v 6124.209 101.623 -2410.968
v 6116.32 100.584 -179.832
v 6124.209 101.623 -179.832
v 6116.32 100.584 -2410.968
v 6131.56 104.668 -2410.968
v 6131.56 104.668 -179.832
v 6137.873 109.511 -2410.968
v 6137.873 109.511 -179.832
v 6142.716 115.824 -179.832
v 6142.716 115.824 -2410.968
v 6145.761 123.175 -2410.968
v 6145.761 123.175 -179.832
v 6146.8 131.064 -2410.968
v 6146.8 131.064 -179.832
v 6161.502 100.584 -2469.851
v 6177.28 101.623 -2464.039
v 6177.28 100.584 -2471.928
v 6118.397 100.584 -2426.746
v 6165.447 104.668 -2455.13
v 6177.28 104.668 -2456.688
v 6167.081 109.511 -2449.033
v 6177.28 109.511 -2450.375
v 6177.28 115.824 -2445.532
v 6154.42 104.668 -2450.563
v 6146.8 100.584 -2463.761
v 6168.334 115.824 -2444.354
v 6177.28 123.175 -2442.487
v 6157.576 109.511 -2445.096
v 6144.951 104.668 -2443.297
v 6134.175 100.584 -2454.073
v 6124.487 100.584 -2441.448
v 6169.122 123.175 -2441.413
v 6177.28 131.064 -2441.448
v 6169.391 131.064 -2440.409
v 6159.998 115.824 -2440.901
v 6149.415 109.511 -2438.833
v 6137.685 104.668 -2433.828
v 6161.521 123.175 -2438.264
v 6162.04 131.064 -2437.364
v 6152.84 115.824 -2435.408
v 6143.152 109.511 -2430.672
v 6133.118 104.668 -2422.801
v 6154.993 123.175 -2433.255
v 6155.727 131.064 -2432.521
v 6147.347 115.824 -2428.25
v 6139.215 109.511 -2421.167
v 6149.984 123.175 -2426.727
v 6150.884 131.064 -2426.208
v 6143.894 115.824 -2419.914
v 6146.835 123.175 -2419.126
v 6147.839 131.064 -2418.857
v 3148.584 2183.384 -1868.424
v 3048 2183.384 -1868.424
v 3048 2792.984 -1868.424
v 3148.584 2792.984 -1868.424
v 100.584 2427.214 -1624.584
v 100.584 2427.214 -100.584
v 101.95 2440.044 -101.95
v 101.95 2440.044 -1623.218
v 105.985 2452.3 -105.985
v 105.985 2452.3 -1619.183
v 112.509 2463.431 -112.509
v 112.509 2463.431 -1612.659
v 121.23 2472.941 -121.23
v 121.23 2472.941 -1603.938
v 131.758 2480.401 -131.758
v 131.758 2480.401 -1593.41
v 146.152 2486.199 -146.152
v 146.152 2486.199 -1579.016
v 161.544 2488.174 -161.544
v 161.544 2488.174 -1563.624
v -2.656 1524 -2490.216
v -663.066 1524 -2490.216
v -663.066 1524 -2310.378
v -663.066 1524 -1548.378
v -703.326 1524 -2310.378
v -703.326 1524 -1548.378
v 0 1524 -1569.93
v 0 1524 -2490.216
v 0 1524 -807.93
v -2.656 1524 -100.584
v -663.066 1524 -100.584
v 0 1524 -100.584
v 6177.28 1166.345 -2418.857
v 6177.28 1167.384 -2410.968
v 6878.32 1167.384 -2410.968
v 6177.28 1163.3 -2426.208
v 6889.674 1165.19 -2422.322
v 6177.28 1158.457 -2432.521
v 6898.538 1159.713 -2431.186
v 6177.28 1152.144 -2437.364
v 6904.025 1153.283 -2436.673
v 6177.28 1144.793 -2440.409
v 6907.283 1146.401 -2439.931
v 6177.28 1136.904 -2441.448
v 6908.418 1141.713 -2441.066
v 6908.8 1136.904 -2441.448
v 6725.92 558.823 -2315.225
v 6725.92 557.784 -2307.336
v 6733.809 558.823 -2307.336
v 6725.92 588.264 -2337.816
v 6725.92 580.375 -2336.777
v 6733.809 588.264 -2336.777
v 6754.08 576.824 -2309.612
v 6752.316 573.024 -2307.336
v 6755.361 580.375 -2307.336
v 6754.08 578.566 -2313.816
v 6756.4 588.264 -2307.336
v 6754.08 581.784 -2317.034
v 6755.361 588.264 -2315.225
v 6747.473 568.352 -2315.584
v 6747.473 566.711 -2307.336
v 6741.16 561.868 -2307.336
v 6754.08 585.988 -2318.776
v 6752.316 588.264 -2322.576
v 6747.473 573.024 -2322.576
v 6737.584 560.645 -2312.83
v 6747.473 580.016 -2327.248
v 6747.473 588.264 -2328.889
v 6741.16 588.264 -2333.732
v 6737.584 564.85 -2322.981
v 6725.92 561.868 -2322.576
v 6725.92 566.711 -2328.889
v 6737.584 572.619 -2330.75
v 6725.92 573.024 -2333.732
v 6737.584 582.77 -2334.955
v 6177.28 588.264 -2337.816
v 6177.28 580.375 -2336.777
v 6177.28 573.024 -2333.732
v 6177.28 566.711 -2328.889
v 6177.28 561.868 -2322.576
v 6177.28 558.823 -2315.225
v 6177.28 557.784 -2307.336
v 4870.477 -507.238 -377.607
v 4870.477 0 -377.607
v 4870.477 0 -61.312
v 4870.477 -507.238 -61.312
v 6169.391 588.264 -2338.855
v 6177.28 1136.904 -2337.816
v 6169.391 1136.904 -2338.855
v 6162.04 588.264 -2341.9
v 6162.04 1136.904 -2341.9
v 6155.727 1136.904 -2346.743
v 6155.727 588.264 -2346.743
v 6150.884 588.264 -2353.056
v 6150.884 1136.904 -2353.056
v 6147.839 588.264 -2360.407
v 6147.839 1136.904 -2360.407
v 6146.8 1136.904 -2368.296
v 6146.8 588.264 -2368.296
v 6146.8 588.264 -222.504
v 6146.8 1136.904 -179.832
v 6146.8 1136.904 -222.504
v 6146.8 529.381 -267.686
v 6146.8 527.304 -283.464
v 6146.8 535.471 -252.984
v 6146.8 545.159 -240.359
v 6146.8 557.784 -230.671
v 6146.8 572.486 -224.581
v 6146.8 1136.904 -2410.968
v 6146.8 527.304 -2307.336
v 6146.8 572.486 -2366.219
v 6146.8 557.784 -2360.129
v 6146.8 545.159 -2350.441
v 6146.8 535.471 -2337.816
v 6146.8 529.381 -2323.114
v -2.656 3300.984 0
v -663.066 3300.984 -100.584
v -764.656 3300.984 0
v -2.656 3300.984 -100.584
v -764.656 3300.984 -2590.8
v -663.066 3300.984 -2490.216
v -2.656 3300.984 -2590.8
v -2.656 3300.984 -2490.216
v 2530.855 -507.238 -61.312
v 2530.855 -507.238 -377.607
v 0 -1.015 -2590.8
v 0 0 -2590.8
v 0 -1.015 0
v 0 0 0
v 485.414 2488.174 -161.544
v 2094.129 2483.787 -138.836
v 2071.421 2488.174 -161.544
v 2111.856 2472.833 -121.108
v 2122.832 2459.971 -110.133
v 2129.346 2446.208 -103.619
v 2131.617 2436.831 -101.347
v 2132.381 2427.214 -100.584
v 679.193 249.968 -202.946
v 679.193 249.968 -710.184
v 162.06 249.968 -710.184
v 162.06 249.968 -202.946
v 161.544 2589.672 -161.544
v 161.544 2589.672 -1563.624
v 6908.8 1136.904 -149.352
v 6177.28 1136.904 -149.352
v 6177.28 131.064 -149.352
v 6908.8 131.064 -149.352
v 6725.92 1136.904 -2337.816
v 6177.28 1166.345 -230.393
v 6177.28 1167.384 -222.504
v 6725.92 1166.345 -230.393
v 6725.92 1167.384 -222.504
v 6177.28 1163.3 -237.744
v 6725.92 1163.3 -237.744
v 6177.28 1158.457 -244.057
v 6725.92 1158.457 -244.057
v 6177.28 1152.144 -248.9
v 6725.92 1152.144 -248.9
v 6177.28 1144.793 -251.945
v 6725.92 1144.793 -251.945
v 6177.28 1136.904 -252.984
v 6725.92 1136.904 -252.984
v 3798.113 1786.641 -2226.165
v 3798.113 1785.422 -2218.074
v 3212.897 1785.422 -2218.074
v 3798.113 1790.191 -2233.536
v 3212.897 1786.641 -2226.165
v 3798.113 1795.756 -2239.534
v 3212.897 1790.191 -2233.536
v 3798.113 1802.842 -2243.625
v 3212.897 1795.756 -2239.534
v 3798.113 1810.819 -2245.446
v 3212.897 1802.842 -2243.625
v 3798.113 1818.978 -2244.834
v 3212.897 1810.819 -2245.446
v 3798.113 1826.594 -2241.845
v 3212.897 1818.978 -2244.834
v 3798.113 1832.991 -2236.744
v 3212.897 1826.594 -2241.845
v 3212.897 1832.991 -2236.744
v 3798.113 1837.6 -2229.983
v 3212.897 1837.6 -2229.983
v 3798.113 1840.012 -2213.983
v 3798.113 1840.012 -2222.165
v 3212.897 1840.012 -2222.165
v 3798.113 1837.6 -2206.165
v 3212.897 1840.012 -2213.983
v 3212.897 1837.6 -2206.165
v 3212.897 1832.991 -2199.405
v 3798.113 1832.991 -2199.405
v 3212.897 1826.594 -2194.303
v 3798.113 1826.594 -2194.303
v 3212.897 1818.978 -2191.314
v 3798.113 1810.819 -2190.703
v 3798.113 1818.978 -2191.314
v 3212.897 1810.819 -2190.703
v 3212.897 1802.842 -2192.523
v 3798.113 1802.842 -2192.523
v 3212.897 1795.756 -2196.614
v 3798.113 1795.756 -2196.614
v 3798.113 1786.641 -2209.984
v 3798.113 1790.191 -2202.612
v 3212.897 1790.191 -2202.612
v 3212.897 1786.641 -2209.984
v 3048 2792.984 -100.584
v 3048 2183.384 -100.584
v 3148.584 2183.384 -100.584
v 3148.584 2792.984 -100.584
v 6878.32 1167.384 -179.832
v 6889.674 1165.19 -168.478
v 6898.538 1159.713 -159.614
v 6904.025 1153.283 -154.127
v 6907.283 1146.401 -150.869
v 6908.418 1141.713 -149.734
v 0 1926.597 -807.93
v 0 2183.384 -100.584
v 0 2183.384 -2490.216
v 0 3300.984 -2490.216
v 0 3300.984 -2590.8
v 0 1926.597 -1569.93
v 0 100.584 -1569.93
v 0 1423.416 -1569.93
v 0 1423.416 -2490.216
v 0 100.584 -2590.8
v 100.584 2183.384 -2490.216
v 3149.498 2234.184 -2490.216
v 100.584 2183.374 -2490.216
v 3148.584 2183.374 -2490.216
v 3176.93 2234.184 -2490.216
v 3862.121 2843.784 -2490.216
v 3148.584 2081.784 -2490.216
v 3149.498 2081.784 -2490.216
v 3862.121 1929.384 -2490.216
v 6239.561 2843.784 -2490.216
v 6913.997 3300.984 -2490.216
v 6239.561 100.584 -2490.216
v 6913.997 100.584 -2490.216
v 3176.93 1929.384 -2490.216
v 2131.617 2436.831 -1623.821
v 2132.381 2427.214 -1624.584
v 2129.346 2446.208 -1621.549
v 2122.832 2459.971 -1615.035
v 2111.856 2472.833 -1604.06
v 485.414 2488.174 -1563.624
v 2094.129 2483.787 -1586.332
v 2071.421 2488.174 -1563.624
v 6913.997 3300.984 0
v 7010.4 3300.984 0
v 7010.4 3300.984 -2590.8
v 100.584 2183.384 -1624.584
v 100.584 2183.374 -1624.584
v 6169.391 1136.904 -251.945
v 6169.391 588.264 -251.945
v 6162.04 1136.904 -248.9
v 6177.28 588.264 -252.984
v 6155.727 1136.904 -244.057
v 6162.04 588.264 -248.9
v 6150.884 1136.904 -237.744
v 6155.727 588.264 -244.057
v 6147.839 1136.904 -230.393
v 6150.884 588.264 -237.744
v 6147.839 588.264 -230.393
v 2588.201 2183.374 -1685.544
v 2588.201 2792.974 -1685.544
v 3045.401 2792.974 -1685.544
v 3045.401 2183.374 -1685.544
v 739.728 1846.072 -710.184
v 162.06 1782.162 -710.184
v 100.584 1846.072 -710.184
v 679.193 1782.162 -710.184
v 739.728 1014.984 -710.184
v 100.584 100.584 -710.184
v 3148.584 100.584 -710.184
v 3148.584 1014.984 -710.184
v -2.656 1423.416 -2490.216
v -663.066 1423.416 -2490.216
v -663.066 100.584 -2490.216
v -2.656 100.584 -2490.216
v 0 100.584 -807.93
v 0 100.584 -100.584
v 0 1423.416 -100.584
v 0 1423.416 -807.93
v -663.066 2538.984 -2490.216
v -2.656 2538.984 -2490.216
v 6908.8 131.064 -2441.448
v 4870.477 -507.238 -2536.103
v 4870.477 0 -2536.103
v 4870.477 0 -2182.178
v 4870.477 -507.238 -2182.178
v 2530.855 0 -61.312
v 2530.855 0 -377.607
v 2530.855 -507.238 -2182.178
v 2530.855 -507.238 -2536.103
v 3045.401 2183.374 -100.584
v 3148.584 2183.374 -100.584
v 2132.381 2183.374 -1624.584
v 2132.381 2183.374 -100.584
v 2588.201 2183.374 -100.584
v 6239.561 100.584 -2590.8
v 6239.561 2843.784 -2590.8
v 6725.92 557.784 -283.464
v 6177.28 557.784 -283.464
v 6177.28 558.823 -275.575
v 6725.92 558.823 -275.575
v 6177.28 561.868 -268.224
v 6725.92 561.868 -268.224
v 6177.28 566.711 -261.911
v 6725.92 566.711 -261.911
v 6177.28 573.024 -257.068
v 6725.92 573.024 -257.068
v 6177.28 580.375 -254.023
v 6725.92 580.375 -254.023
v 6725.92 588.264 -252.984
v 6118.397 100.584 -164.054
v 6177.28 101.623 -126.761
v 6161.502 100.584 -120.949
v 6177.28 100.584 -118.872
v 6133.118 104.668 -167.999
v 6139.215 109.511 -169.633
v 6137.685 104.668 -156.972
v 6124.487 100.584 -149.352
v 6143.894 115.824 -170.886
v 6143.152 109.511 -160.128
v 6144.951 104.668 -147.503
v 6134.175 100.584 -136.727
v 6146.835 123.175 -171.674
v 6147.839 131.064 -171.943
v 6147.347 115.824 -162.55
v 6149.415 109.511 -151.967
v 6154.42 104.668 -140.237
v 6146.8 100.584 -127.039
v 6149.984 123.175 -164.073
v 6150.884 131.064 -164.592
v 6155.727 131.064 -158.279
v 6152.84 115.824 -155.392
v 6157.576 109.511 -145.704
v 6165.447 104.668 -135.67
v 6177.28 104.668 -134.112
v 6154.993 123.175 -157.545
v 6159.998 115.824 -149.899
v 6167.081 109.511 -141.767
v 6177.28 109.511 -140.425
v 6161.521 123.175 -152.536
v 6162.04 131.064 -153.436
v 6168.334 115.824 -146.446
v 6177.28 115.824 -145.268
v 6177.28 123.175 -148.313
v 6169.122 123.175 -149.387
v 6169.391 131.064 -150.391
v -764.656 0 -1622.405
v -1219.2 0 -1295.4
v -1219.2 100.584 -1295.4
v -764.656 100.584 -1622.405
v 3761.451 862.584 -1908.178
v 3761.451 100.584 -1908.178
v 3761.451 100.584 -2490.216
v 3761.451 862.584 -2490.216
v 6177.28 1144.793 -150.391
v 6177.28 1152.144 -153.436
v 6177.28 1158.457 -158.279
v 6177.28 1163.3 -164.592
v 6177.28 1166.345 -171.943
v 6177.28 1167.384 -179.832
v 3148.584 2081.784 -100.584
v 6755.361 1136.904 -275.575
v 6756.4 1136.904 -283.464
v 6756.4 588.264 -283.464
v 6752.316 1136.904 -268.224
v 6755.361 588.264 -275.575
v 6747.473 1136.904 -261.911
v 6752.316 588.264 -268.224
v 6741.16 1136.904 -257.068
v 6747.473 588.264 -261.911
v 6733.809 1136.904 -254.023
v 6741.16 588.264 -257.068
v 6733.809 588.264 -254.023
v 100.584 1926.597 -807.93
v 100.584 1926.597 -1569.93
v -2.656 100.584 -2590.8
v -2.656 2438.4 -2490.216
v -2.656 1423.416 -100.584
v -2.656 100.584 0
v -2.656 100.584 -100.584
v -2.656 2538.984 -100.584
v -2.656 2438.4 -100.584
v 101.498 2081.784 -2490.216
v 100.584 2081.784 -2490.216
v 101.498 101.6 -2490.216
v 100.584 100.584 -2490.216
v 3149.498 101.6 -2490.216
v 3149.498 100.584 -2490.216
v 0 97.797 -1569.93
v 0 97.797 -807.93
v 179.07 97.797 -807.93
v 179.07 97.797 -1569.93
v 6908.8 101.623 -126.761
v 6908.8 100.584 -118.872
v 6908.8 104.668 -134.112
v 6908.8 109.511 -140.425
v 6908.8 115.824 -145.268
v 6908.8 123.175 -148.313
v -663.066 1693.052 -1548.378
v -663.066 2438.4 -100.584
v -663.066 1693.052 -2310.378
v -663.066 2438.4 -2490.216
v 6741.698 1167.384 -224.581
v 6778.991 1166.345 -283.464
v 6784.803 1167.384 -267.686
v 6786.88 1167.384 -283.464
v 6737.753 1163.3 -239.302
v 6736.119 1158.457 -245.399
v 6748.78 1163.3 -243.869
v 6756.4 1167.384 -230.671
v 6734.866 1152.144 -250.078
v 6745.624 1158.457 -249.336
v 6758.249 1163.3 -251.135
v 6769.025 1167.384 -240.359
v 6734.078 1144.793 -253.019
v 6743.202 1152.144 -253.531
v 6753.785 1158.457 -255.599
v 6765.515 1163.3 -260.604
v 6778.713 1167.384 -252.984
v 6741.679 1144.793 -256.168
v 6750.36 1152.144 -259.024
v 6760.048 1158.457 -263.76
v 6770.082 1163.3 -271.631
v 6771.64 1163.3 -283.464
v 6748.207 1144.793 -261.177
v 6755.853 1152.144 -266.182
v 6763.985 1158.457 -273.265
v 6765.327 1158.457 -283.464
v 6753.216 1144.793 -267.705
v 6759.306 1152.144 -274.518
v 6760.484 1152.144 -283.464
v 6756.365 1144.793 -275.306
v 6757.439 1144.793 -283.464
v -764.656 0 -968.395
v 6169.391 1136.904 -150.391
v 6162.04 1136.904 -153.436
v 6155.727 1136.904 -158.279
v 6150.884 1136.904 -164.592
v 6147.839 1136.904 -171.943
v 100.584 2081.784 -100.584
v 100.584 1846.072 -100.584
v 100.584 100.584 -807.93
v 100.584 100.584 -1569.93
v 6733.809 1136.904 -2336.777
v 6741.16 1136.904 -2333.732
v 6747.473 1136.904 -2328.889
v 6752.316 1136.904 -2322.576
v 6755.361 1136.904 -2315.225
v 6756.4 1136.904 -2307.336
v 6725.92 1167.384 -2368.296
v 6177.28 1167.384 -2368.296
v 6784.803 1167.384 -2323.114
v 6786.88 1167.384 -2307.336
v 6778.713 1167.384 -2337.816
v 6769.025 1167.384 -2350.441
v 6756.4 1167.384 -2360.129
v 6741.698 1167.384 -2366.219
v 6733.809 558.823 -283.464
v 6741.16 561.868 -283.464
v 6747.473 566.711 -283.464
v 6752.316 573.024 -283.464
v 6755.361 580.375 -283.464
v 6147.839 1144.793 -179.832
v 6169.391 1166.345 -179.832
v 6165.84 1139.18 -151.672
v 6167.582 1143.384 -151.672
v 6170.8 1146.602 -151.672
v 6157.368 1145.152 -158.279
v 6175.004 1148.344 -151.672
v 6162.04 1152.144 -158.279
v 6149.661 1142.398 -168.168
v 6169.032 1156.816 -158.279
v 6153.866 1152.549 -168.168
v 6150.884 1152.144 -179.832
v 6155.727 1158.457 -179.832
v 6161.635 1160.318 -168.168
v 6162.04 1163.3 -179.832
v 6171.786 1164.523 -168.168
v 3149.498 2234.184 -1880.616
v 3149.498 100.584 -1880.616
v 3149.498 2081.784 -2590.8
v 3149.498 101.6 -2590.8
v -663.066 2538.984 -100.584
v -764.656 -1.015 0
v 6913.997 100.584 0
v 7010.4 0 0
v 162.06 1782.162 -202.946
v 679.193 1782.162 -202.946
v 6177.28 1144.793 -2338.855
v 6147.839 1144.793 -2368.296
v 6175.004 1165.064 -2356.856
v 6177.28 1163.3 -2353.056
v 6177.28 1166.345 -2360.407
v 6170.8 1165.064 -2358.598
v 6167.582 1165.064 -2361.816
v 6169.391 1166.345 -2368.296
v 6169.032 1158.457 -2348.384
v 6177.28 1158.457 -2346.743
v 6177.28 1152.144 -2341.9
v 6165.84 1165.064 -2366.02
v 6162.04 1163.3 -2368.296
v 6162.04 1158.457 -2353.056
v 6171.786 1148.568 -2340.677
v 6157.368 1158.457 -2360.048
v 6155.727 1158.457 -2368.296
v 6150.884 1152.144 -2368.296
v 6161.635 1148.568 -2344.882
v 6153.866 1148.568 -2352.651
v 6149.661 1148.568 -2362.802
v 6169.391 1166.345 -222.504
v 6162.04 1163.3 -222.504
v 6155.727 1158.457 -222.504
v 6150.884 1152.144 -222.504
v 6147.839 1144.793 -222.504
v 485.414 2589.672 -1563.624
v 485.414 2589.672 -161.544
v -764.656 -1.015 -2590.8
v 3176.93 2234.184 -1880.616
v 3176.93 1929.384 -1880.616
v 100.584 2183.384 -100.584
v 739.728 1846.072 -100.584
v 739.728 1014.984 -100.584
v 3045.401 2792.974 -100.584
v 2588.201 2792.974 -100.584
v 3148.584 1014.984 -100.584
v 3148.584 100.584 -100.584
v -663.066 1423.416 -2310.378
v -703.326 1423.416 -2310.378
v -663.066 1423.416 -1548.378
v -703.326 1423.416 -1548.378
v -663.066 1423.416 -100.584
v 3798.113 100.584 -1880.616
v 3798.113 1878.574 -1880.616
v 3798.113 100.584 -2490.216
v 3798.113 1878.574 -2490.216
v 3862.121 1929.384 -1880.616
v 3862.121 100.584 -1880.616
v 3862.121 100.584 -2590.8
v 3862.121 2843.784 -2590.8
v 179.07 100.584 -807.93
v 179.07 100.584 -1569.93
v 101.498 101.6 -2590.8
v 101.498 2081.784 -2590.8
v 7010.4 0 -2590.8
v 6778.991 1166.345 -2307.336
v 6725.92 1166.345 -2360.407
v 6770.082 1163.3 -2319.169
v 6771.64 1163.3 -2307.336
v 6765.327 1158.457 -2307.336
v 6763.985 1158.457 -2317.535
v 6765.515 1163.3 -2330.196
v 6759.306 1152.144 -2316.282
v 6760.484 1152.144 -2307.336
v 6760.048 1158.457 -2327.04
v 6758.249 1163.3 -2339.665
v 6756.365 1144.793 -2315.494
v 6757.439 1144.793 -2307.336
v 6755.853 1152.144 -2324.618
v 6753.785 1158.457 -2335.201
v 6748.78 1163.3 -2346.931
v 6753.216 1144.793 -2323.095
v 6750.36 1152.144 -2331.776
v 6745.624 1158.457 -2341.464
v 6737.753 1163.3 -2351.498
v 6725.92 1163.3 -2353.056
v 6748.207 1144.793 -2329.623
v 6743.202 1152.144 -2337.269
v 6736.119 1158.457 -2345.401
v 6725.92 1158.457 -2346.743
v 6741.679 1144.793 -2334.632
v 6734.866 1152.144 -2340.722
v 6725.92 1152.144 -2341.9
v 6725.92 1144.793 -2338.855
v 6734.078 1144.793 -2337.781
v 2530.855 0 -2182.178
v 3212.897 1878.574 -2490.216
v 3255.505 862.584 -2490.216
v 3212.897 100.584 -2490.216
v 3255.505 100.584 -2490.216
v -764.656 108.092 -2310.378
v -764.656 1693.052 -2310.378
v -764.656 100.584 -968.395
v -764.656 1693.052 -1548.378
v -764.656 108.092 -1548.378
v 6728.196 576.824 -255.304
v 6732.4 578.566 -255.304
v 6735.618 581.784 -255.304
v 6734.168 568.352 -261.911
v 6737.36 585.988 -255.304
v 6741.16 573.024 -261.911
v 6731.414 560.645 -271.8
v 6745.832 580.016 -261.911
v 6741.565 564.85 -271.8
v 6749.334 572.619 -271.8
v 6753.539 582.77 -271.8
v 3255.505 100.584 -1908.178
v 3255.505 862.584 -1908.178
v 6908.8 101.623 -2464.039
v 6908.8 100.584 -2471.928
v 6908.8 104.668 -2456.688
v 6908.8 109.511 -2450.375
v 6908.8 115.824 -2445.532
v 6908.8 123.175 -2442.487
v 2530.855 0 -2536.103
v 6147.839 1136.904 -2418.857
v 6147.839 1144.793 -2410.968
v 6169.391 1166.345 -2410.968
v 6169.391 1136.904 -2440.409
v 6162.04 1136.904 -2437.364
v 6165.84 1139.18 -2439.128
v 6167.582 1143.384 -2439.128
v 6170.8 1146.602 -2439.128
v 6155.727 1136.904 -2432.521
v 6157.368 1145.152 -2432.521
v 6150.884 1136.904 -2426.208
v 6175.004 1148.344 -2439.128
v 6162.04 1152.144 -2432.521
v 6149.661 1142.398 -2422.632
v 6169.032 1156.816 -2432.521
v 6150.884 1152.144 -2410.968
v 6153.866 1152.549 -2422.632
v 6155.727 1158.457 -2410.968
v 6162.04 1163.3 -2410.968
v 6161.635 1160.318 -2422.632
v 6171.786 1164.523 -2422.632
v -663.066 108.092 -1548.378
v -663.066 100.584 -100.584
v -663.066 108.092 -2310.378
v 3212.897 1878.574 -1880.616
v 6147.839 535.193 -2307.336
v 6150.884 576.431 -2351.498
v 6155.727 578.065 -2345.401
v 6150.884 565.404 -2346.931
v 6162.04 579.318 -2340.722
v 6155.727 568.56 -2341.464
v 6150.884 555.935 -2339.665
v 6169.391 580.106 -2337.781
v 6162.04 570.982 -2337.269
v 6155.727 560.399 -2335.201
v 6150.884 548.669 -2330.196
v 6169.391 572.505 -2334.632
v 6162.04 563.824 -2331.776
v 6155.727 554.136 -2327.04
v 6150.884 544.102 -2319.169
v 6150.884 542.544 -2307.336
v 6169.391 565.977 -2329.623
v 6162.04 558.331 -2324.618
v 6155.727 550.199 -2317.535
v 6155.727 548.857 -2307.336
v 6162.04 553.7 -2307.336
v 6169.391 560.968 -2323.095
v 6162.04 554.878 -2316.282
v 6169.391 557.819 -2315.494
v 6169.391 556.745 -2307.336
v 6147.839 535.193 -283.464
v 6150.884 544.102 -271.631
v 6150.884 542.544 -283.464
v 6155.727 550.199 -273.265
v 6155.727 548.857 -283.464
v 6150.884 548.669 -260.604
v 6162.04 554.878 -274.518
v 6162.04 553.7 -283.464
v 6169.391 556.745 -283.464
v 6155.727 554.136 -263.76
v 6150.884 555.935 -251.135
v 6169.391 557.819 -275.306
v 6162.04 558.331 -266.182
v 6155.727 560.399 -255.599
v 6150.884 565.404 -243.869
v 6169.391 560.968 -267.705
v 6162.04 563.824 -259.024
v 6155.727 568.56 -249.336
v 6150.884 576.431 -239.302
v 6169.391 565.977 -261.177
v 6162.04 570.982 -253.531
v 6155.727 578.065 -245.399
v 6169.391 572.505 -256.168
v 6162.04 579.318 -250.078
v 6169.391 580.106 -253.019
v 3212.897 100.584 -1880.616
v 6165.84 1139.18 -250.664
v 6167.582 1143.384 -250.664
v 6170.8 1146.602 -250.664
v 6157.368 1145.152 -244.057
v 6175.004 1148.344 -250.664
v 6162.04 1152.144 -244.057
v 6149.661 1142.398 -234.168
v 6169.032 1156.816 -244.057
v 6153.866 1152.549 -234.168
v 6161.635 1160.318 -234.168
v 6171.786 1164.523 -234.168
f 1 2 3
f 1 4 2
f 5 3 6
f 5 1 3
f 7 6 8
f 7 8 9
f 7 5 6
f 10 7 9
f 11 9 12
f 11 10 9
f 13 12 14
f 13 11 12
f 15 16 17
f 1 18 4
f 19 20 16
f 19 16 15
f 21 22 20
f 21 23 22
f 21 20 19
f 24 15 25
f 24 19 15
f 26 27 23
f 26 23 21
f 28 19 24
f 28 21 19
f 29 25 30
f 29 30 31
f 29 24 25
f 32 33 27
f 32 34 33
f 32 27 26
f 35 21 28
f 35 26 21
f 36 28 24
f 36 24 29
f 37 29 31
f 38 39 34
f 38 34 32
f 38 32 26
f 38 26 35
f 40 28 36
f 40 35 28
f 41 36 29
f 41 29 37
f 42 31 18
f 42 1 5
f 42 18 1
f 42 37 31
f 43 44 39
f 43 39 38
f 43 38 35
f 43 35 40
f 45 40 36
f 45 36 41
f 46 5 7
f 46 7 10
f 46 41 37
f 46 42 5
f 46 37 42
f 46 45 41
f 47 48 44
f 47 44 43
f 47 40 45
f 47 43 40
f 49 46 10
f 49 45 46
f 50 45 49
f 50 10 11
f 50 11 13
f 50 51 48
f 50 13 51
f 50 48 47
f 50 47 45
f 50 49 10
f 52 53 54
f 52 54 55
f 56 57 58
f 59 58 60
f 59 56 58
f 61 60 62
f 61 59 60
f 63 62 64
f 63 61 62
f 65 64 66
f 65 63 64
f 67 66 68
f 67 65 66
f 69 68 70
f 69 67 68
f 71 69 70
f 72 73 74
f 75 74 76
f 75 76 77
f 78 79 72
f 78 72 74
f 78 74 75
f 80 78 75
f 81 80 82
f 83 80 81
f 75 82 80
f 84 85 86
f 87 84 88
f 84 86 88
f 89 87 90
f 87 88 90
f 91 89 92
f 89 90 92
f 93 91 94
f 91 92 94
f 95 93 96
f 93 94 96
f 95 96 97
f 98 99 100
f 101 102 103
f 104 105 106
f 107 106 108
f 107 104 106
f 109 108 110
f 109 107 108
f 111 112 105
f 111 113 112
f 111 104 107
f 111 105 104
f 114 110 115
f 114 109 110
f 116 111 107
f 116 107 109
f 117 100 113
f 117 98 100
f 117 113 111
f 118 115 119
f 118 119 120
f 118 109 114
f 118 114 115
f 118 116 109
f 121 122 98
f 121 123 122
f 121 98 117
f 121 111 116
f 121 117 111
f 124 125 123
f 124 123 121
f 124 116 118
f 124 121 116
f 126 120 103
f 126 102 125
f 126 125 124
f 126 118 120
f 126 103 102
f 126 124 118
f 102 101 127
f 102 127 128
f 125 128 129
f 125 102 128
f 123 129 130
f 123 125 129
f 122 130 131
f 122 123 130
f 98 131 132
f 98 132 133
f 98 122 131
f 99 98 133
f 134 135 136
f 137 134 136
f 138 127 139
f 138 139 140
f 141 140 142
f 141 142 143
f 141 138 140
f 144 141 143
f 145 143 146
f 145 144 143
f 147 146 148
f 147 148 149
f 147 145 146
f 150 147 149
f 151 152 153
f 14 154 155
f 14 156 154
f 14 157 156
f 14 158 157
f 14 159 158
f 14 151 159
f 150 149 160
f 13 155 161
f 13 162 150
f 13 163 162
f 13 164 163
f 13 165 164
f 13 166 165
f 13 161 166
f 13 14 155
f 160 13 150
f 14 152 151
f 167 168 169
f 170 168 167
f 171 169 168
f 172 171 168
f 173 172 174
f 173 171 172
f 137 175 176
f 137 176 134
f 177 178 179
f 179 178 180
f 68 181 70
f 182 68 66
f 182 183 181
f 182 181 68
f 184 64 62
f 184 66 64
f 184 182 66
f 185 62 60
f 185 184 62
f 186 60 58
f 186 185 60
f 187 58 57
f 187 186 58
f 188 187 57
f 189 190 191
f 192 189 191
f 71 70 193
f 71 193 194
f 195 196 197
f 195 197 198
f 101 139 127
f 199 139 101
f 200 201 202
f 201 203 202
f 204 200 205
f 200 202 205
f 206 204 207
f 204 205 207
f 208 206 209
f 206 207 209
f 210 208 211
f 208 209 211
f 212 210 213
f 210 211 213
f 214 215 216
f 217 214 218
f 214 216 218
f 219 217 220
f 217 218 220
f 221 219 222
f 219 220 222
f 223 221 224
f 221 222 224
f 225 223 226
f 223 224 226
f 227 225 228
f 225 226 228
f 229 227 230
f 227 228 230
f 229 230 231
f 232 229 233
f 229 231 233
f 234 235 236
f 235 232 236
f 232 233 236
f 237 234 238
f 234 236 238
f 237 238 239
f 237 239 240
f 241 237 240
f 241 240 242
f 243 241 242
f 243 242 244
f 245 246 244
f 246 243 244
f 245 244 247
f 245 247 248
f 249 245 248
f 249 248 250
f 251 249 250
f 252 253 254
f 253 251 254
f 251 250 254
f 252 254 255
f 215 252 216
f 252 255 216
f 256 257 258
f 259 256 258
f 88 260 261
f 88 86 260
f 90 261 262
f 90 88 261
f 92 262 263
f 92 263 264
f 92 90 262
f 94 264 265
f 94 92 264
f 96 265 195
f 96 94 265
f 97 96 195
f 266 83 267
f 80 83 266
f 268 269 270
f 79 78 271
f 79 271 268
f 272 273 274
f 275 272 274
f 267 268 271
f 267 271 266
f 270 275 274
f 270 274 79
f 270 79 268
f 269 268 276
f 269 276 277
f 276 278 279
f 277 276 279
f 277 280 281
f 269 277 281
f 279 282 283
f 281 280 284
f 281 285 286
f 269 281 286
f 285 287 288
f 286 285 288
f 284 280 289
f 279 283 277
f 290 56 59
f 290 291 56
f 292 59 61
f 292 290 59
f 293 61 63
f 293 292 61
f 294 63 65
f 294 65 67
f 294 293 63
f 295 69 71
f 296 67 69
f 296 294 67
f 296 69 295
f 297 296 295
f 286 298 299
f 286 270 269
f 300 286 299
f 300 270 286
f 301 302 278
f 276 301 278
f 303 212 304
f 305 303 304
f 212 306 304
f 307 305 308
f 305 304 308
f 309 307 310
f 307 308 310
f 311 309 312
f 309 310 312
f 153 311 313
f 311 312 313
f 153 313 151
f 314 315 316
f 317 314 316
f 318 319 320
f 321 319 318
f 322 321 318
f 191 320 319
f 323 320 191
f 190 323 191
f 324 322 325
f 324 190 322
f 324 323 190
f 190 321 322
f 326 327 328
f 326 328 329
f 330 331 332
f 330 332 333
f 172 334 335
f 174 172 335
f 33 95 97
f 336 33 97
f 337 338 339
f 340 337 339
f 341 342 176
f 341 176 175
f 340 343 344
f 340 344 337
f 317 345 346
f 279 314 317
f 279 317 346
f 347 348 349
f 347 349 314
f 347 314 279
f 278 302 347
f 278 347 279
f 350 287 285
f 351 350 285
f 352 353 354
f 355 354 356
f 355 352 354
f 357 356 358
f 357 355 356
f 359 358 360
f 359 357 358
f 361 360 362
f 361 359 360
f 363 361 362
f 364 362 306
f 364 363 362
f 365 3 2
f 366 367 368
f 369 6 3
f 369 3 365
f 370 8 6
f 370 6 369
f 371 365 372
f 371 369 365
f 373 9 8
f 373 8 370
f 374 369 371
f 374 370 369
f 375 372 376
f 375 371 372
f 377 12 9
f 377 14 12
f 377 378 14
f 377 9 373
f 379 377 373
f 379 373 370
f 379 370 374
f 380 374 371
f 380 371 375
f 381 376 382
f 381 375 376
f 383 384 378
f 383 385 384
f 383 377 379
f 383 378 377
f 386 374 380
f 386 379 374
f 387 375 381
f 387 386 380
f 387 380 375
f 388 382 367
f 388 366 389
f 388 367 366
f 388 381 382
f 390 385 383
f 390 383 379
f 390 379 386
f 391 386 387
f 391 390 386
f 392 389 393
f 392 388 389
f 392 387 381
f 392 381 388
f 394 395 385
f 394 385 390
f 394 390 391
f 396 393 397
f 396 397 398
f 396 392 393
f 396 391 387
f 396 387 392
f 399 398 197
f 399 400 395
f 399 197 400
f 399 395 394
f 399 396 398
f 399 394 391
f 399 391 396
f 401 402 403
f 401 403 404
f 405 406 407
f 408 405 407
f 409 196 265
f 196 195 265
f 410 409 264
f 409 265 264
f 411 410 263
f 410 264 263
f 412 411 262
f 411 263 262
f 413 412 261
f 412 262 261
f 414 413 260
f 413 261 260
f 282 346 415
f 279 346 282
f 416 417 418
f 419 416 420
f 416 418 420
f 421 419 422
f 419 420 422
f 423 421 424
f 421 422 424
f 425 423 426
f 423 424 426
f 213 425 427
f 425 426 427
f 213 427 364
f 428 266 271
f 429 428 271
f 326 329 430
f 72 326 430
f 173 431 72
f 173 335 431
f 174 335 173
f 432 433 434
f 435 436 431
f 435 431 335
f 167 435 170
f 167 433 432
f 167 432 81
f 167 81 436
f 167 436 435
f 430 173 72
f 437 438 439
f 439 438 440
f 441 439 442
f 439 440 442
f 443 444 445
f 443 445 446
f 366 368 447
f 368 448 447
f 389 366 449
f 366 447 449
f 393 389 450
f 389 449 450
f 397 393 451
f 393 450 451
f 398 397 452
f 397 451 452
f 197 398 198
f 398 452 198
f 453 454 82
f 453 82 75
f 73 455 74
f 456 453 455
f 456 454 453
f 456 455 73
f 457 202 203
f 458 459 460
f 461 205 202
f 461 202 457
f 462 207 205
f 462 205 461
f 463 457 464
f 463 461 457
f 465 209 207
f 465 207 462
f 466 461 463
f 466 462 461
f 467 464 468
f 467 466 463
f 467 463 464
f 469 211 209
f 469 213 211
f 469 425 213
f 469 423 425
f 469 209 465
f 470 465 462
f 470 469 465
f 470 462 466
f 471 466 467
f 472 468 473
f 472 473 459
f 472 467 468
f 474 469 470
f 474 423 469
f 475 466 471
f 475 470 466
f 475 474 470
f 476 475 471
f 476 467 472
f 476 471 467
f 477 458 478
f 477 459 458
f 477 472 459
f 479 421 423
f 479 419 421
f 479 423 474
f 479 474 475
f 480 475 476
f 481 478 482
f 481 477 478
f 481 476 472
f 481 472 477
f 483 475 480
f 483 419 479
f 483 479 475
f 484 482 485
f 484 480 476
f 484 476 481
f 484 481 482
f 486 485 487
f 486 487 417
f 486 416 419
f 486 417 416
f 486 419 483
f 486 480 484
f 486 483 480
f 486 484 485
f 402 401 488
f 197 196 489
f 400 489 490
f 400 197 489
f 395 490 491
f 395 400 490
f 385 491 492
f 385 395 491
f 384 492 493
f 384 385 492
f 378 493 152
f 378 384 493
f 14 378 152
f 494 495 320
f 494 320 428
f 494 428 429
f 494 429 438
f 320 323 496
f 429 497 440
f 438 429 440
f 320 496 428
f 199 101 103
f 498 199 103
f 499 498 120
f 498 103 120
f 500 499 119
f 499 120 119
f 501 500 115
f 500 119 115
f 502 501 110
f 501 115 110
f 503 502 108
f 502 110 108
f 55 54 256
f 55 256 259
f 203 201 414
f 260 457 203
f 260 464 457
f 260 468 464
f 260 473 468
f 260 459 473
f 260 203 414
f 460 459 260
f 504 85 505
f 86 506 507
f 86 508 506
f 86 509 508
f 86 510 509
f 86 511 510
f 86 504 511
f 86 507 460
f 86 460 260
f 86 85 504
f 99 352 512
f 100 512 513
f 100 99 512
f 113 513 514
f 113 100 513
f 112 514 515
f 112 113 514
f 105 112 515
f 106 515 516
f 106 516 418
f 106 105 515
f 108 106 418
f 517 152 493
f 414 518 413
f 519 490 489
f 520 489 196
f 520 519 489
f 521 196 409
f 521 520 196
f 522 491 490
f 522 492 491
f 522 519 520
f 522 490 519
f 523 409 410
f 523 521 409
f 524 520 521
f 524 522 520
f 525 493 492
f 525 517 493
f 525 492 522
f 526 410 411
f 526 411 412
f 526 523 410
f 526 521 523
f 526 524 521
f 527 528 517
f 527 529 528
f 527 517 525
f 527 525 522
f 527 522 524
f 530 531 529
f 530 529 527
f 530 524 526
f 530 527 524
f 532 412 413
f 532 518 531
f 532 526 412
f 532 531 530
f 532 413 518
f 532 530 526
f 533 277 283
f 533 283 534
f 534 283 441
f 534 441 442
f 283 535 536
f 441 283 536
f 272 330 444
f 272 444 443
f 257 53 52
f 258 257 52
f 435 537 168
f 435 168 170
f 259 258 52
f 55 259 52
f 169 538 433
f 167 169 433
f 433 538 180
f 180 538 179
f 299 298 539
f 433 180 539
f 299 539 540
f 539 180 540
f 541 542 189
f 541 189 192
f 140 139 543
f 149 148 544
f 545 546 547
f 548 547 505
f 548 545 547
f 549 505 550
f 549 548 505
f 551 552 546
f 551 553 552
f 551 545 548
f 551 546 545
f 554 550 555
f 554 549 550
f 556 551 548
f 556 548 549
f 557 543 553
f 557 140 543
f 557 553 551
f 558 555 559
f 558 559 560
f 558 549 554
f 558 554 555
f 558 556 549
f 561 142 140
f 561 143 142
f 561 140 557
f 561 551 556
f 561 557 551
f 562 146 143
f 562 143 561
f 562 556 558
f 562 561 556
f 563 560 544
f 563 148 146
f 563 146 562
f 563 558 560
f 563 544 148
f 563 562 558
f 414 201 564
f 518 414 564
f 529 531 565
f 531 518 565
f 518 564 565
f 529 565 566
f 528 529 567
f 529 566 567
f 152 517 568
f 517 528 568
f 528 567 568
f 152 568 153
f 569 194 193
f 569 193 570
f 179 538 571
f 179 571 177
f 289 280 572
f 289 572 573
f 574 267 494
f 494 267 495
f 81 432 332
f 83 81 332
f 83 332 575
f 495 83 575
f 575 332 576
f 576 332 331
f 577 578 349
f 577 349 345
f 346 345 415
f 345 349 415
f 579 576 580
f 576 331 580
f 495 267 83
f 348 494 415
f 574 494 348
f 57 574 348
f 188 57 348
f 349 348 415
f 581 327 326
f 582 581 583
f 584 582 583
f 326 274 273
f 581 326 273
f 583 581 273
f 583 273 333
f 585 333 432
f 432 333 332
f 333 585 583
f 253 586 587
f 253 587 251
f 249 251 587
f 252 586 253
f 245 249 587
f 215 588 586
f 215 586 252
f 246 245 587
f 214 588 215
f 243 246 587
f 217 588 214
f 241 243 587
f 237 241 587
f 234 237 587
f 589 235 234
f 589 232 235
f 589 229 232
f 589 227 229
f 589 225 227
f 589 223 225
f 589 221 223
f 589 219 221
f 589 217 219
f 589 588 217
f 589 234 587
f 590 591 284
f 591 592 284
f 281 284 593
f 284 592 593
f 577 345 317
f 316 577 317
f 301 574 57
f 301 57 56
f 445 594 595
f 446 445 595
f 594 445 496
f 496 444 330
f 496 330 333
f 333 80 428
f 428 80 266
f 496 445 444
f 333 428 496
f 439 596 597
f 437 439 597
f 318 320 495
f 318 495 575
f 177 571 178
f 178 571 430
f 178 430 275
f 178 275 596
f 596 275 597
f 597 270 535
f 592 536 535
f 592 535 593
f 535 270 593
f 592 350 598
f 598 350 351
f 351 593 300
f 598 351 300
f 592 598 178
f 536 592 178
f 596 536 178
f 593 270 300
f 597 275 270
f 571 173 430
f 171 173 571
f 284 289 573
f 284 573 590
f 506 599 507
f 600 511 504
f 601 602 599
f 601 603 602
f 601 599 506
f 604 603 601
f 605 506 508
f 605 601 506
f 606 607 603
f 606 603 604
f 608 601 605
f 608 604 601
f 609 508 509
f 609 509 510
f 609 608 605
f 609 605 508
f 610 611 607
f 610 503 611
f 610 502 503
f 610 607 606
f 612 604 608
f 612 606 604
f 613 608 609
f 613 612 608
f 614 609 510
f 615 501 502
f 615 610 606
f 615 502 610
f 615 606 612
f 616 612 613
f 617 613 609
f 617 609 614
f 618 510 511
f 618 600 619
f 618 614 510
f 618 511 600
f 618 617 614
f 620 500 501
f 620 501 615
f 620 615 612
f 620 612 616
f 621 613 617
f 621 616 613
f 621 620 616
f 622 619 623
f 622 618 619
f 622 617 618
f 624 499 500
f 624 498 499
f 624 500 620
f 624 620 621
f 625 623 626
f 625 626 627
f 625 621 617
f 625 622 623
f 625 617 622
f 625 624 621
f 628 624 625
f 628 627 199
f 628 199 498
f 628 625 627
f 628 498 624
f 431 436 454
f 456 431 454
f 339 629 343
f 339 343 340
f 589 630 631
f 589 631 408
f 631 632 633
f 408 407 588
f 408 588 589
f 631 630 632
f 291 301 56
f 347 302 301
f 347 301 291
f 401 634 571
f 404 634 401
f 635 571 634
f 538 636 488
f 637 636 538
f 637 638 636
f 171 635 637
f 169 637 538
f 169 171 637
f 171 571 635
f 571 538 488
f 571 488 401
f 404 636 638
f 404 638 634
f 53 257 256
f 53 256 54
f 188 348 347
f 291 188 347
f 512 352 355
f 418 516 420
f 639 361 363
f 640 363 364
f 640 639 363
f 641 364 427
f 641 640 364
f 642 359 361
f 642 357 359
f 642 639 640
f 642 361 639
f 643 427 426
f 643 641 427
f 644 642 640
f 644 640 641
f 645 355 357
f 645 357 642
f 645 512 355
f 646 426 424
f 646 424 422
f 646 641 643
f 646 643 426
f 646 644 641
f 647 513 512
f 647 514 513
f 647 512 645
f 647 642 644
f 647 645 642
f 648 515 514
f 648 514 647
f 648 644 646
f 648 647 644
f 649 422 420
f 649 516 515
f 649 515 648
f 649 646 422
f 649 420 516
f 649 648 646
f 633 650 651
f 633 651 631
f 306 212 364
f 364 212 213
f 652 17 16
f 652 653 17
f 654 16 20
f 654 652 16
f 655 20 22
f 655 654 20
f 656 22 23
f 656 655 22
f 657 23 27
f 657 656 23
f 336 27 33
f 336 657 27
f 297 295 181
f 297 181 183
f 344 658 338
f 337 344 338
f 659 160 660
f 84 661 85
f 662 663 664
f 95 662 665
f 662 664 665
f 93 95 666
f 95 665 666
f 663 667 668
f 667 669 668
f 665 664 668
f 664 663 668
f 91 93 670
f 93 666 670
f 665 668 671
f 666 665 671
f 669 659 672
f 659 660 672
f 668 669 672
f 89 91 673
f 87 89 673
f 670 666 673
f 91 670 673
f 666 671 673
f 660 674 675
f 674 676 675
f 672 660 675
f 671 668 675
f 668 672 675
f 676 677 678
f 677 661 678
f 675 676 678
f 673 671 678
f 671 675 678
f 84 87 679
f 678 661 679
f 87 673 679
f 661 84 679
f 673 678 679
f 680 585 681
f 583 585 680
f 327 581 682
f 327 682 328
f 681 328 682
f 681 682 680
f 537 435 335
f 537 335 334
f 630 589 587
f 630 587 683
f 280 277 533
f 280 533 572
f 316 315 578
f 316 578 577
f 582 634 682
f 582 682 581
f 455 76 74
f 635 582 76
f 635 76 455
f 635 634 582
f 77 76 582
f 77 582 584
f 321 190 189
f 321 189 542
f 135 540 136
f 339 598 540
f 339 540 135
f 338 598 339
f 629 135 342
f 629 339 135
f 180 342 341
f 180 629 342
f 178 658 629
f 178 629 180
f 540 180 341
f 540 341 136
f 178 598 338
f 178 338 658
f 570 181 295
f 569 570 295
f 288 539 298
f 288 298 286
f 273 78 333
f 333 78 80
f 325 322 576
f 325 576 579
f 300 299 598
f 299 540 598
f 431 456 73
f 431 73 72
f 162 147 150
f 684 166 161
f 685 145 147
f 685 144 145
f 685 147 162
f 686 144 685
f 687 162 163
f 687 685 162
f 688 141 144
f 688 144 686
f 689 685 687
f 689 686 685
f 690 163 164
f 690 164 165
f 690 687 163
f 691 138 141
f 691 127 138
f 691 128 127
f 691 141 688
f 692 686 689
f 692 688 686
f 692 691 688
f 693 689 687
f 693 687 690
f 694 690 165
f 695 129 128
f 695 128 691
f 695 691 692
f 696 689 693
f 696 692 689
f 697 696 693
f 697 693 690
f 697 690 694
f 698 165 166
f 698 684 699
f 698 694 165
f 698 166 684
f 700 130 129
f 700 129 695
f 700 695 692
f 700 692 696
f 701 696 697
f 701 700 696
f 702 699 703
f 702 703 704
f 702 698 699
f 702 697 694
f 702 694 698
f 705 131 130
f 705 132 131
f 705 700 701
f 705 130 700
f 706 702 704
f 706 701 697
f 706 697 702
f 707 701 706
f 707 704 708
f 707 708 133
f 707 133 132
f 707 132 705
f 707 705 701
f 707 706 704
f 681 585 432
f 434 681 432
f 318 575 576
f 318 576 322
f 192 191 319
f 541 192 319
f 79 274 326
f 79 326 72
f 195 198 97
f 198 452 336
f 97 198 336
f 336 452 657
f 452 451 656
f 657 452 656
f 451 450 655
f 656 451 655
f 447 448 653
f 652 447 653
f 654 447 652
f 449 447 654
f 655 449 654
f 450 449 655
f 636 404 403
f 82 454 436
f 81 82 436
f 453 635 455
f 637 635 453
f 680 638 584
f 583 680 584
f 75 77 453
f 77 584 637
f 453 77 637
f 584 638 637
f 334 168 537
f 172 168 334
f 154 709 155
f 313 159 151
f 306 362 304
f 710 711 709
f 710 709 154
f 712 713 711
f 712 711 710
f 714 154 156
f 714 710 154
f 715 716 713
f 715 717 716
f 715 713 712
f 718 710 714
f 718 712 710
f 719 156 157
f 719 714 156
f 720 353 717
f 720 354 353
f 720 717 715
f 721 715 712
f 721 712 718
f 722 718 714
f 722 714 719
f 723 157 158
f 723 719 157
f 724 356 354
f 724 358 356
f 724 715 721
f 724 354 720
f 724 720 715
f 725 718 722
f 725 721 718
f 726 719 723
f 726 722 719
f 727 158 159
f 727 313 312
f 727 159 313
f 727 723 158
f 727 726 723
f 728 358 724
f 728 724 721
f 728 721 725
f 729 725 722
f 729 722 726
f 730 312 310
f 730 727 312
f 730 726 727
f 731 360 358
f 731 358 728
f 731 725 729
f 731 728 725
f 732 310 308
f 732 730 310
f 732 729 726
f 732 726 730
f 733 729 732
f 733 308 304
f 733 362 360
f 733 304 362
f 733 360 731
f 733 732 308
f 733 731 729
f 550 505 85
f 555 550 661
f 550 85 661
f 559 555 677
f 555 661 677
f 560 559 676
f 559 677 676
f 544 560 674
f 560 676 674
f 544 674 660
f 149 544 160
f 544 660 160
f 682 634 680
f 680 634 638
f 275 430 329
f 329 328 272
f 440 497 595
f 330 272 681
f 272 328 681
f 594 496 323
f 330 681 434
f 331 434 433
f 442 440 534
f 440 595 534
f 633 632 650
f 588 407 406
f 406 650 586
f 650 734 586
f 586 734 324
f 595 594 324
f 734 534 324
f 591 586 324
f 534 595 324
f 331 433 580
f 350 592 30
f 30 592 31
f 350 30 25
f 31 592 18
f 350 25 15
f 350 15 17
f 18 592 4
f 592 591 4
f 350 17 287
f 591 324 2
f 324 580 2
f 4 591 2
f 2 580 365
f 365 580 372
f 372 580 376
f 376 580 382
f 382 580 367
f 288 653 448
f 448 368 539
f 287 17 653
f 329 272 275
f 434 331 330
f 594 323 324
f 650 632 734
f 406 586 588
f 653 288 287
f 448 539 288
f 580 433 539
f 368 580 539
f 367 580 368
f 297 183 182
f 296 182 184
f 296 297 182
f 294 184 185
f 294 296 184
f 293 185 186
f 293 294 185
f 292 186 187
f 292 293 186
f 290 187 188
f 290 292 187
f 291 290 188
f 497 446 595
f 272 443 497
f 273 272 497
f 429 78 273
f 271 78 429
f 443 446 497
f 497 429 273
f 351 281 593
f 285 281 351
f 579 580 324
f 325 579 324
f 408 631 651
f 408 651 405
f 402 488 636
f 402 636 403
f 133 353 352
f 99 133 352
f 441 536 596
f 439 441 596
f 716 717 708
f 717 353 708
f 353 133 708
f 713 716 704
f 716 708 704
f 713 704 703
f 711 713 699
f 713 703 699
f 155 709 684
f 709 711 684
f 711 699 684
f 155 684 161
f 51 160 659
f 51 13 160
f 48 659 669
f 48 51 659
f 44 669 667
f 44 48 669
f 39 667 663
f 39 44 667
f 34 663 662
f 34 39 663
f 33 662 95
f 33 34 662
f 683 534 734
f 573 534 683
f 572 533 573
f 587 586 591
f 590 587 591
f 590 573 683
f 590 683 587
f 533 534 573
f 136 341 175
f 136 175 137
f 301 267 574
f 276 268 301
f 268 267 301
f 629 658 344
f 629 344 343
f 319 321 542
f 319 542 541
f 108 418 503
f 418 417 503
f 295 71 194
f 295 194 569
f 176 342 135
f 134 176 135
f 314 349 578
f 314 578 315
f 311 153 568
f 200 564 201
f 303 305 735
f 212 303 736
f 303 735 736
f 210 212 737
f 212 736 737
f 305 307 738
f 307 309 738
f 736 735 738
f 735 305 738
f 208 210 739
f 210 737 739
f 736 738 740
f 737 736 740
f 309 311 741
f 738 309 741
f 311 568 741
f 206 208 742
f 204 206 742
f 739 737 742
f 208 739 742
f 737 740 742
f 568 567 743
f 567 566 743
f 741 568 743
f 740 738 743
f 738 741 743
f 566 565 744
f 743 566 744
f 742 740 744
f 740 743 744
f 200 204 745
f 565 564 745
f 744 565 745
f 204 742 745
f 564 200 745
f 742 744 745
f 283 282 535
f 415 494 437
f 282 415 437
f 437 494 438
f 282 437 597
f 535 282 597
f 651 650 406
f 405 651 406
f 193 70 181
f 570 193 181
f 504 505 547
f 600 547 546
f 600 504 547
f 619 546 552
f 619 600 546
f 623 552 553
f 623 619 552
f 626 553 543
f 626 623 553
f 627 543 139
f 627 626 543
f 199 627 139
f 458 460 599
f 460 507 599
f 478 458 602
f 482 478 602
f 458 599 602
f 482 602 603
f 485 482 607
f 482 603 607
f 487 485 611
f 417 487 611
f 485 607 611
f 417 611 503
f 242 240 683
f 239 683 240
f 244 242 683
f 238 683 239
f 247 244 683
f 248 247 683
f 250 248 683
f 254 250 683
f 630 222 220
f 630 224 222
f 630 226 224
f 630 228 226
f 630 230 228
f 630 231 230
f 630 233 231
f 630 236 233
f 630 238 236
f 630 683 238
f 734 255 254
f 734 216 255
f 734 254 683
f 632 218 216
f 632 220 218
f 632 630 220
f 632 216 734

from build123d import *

# Parameters (mm, degrees)
BOSS_EXTRUDE1_DEPTH  = 100.584
SKETCH3_W            = 7010.4
SKETCH3_H            = 100.584
BOSS_EXTRUDE2_DEPTH  = 3200.4
SKETCH4_W            = 100.584
SKETCH4_H            = 2389.632
BOSS_EXTRUDE3_DEPTH  = 2082.799999898
SKETCH5_W            = 3048
SKETCH5_H            = 609.6
BOSS_EXTRUDE4_DEPTH  = 914.4
SKETCH6_W            = 762
SKETCH6_H            = 1828.8
CUT_EXTRUDE1_DEPTH   = 179.07
SKETCH7_W            = 762
SKETCH7_H            = 2389.632
BOSS_EXTRUDE5_DEPTH  = 1066.8
SKETCH8_W            = 609.6
SKETCH8_H            = 2084.832
CUT_EXTRUDE2_DEPTH   = 609.6
SKETCH9_W            = 762
SKETCH9_H            = 48.768
CUT_EXTRUDE3_DEPTH   = 1066.8
FILLET1_R            = 30.48
SKETCH11_W           = 2389.632
SKETCH11_H           = 101.58984
BOSS_EXTRUDE6_DEPTH  = 3048
SKETCH12_W           = 100.584
SKETCH12_H           = 1767.84
BOSS_EXTRUDE7_DEPTH  = 609.6
SKETCH14_W           = 3048
SKETCH14_H           = 1980.184000102
CUT_EXTRUDE4_DEPTH   = 121.92
BOSS_EXTRUDE8_DEPTH  = 609.6
SKETCH16_W           = 64.008
SKETCH16_H           = 1828.8
BOSS_EXTRUDE9_DEPTH  = 609.6
SKETCH17_W           = 2377.44
SKETCH17_H           = 2743.2
CUT_EXTRUDE5_DEPTH   = 609.6
SKETCH20_W           = 762
SKETCH20_H           = 2590.8
BOSS_EXTRUDE10_DEPTH = 3200.4
SKETCH23_W           = 660.41016
SKETCH23_H           = 2389.632
CUT_EXTRUDE6_DEPTH   = 3200.4
SKETCH24_W           = 764.655724872
SKETCH24_H           = 2590.8
BOSS_EXTRUDE11_DEPTH = 101.598984
SKETCH25_W           = 762
SKETCH25_H           = 1584.96
CUT_EXTRUDE7_DEPTH   = 101.598984
SKETCH26_W           = 660.41016
SKETCH26_H           = 100.584
BOSS_EXTRUDE12_DEPTH = 2427.984984
SKETCH27_W           = 2389.632
SKETCH27_H           = 100.584
BOSS_EXTRUDE13_DEPTH = 703.326
SKETCH28_W           = 2031.7968
SKETCH28_H           = 1524
BOSS_EXTRUDE14_DEPTH = 304.8
FILLET2_R            = 60.96
SKETCH29_W           = 323.869500016
SKETCH29_H           = 1402.08
BOSS_EXTRUDE15_DEPTH = 101.4984
SKETCH30_W           = 457.2
SKETCH30_H           = 1584.96
BOSS_EXTRUDE16_DEPTH = 609.6
SKETCH32_W           = 505.94565908
SKETCH32_H           = 582.037684295
BOSS_EXTRUDE25_DEPTH = 762
SKETCH33_W           = 96.402821382
SKETCH33_H           = 2490.216
BOSS_EXTRUDE26_DEPTH = 3200.4
SKETCH34_R           = 27.448199129
BOSS_EXTRUDE27_DEPTH = 631.444
SKETCH35_W           = 639.143683672
SKETCH35_H           = 609.6
BOSS_EXTRUDE28_DEPTH = 831.088
SKETCH36_W           = 517.132618211
SKETCH36_H           = 1532.194064783
CUT_EXTRUDE9_DEPTH   = 507.238
SKETCH37_W           = 2339.621689526
SKETCH37_H           = 316.294331202
SKETCH37_H_2         = 353.925095988
BOSS_EXTRUDE29_DEPTH = 507.238


with BuildPart() as part:
    # Sketch1 → Boss-Extrude1 (new body)
    with BuildSketch(Plane(origin=(0, 0, 0), x_dir=(1, 0, 0), z_dir=(0, 1, 0))):
        Polygon((0, 0), (0, 418.290787275), (-1219.2, 1295.4), (0, 2172.509212725), (0, 2590.8), (7010.4, 2590.8), (7010.4, 0), align=None)
    extrude(amount=BOSS_EXTRUDE1_DEPTH)

    # Sketch3 → Boss-Extrude2 (add)
    with BuildSketch(Plane(origin=(0, 100.584, 0), x_dir=(1, 0, 0), z_dir=(0, 1, 0))):
        with Locations((3505.2, 2540.508)):
            Rectangle(SKETCH3_W, SKETCH3_H)
    extrude(amount=BOSS_EXTRUDE2_DEPTH)

    # Sketch4 → Boss-Extrude3 (add)
    with BuildSketch(Plane(origin=(0, 100.584, 0), x_dir=(1, 0, 0), z_dir=(0, 1, 0))):
        with Locations((50.292, 1295.4)):
            Rectangle(SKETCH4_W, SKETCH4_H)
    extrude(amount=BOSS_EXTRUDE3_DEPTH)

    # Sketch5 → Boss-Extrude4 (add)
    with BuildSketch(Plane(origin=(0, 100.584, 0), x_dir=(1, 0, 0), z_dir=(0, 1, 0))):
        with Locations((1624.584, 405.384)):
            Rectangle(SKETCH5_W, SKETCH5_H)
    extrude(amount=BOSS_EXTRUDE4_DEPTH)

    # Sketch6 → Cut-Extrude1 (cut)
    with BuildSketch(Plane(origin=(0, 0, 0), x_dir=(0, 0, -1), z_dir=(1, 0, 0))):
        with Locations((1188.929954617, 1012.196870273)):
            Rectangle(SKETCH6_W, SKETCH6_H)
    extrude(amount=CUT_EXTRUDE1_DEPTH, mode=Mode.SUBTRACT)

    # Sketch7 → Boss-Extrude5 (add)
    with BuildSketch(Plane(origin=(0, 100.584, 0), x_dir=(1, 0, 0), z_dir=(0, 1, 0))):
        with Locations((6527.79997968, 1295.4)):
            Rectangle(SKETCH7_W, SKETCH7_H)
    extrude(amount=BOSS_EXTRUDE5_DEPTH)

    # Sketch8 → Cut-Extrude2 (cut)
    with BuildSketch(Plane(origin=(0, 1167.384, 0), x_dir=(1, 0, 0), z_dir=(0, 1, 0))):
        with Locations((6451.59997968, 1295.4)):
            Rectangle(SKETCH8_W, SKETCH8_H)
    extrude(amount=-CUT_EXTRUDE2_DEPTH, mode=Mode.SUBTRACT)

    # Sketch9 → Cut-Extrude3 (cut)
    with BuildSketch(Plane(origin=(0, 1167.384, 0), x_dir=(1, 0, 0), z_dir=(0, 1, 0))):
        with Locations((6527.79997968, 2465.832)):
            Rectangle(SKETCH9_W, SKETCH9_H)
        with Locations((6527.79997968, 124.968)):
            Rectangle(SKETCH9_W, SKETCH9_H)
    extrude(amount=-CUT_EXTRUDE3_DEPTH, mode=Mode.SUBTRACT)

    # Fillet1
    fillet1_edges = [part.edges().sort_by_distance(p)[0] for p in [
        (6146.79997968, 1167.384, -201.168),
        (6146.79997968, 557.784, -1295.4),
        (6146.79997968, 862.584, -252.984),
        (6451.59997968, 557.784, -2337.816),
        (6146.79997968, 862.584, -2337.816),
        (6756.39997968, 557.784, -1295.4),
        (6756.39997968, 862.584, -2337.816),
        (6451.59997968, 557.784, -252.984),
        (6756.39997968, 862.584, -252.984),
        (6451.59997968, 1167.384, -252.984),
        (6756.39997968, 1167.384, -1295.4),
        (6451.59997968, 1167.384, -2337.816),
        (6146.79997968, 1167.384, -2389.632),
        (6146.79997968, 100.584, -1295.4),
        (6146.79997968, 633.984, -2441.448),
        (6527.79997968, 100.584, -2441.448),
        (6527.79997968, 1167.384, -2441.448),
        (6908.79997968, 1167.384, -1295.4),
        (6527.79997968, 100.584, -149.352),
        (6146.79997968, 633.984, -149.352),
        (6527.79997968, 1167.384, -149.352),
    ]]
    fillet(fillet1_edges, radius=FILLET1_R)

    # Sketch11 → Boss-Extrude6 (add)
    with BuildSketch(Plane(origin=(100.584, 0, 0), x_dir=(0, 0, -1), z_dir=(1, 0, 0))):
        with Locations((1295.4, 2132.57892)):
            Rectangle(SKETCH11_W, SKETCH11_H)
    extrude(amount=BOSS_EXTRUDE6_DEPTH)

    # Sketch14 → Cut-Extrude4 (cut)
    with BuildSketch(Plane(origin=(0, 0, -2590.8), x_dir=(-1, 0, 0), z_dir=(0, 0, -1))):
        with Locations((-1625.4984, 1091.691999949)):
            Rectangle(SKETCH14_W, SKETCH14_H)
    extrude(amount=-CUT_EXTRUDE4_DEPTH, mode=Mode.SUBTRACT)

    # Sketch15 → Boss-Extrude8 (add)
    with BuildSketch(Plane.XY.offset(-2490.216)):
        Polygon((3176.9304, 1929.384), (3798.1128, 1929.384), (3798.1128, 1878.57384), (3212.8968, 1878.57384), (3212.8968, 100.584), (3149.4984, 100.584), (3149.4984, 1878.57384), (3149.4984, 1929.384), (3149.4984, 2234.184), (3176.9304, 2234.184), align=None)
    extrude(amount=BOSS_EXTRUDE8_DEPTH)

    # Sketch16 → Boss-Extrude9 (add)
    with BuildSketch(Plane.XY.offset(-2490.216)):
        with Locations((3830.1168, 1014.984)):
            Rectangle(SKETCH16_W, SKETCH16_H)
    extrude(amount=BOSS_EXTRUDE9_DEPTH)

    # Sketch17 → Cut-Extrude5 (cut)
    with BuildSketch(Plane.XY.offset(-2490.216)):
        with Locations((5050.8408, 1472.184)):
            Rectangle(SKETCH17_W, SKETCH17_H)
    extrude(amount=-CUT_EXTRUDE5_DEPTH, mode=Mode.SUBTRACT)

    # Sketch20 → Boss-Extrude10 (add)
    with BuildSketch(Plane(origin=(0, 100.584, 0), x_dir=(1, 0, 0), z_dir=(0, 1, 0))):
        with Locations((-383.655724872, 1295.4)):
            Rectangle(SKETCH20_W, SKETCH20_H)
    extrude(amount=BOSS_EXTRUDE10_DEPTH)

    # Sketch23 → Cut-Extrude6 (cut)
    with BuildSketch(Plane(origin=(0, 3300.984, 0), x_dir=(1, 0, 0), z_dir=(0, 1, 0))):
        with Locations((-332.860804872, 1295.4)):
            Rectangle(SKETCH23_W, SKETCH23_H)
    extrude(amount=-CUT_EXTRUDE6_DEPTH, mode=Mode.SUBTRACT)

    # Sketch24 → Boss-Extrude11 (add)
    with BuildSketch(Plane.XZ.offset(-100.584)):
        with Locations((-382.327862436, -1295.4)):
            Rectangle(SKETCH24_W, SKETCH24_H)
    extrude(amount=BOSS_EXTRUDE11_DEPTH)

    # Sketch25 → Cut-Extrude7 (cut)
    with BuildSketch(Plane.ZY.offset(764.655724872)):
        with Locations((-1929.378363182, 900.571886789)):
            Rectangle(SKETCH25_W, SKETCH25_H)
    extrude(amount=-CUT_EXTRUDE7_DEPTH, mode=Mode.SUBTRACT)

    # Sketch26 → Boss-Extrude12 (add)
    with BuildSketch(Plane(origin=(0, 0, -100.584), x_dir=(-1, 0, 0), z_dir=(0, 0, -1))):
        with Locations((332.860804872, 2488.692)):
            Rectangle(SKETCH26_W, SKETCH26_H)
    extrude(amount=BOSS_EXTRUDE12_DEPTH)

    # Sketch27 → Boss-Extrude13 (add)
    with BuildSketch(Plane.ZY):
        with Locations((-1295.4, 1473.708)):
            Rectangle(SKETCH27_W, SKETCH27_H)
    extrude(amount=BOSS_EXTRUDE13_DEPTH)

    # Sketch28 → Boss-Extrude14 (add)
    with BuildSketch(Plane(origin=(0, 2183.37384, 0), x_dir=(1, 0, 0), z_dir=(0, 1, 0))):
        with Locations((1116.4824, 862.584)):
            Rectangle(SKETCH28_W, SKETCH28_H)
    extrude(amount=BOSS_EXTRUDE14_DEPTH)

    # Fillet2
    fillet2_edges = [part.edges().sort_by_distance(p)[0] for p in [
        (100.584, 2488.17384, -862.584),
        (1116.4824, 2488.17384, -100.584),
        (2132.3808, 2488.17384, -862.584),
        (1116.4824, 2488.17384, -1624.584),
    ]]
    fillet(fillet2_edges, radius=FILLET2_R)

    # Sketch29 → Boss-Extrude15 (add)
    with BuildSketch(Plane(origin=(0, 2488.17384, 0), x_dir=(1, 0, 0), z_dir=(0, 1, 0))):
        with Locations((323.478750008, 862.584)):
            Rectangle(SKETCH29_W, SKETCH29_H)
    extrude(amount=BOSS_EXTRUDE15_DEPTH)

    # Sketch30 → Boss-Extrude16 (add)
    with BuildSketch(Plane(origin=(0, 2183.37384, 0), x_dir=(1, 0, 0), z_dir=(0, 1, 0))):
        with Locations((2816.80125235, 893.064)):
            Rectangle(SKETCH30_W, SKETCH30_H)
    extrude(amount=BOSS_EXTRUDE16_DEPTH)

    # Sketch32 → Boss-Extrude25 (add)
    with BuildSketch(Plane(origin=(0, 100.584, 0), x_dir=(1, 0, 0), z_dir=(0, 1, 0))):
        with Locations((3508.478278258, 2199.197157853)):
            Rectangle(SKETCH32_W, SKETCH32_H)
    extrude(amount=BOSS_EXTRUDE25_DEPTH)

    # Sketch33 → Boss-Extrude26 (add)
    with BuildSketch(Plane(origin=(0, 100.584, 0), x_dir=(1, 0, 0), z_dir=(0, 1, 0))):
        with Locations((6962.198589309, 1245.108)):
            Rectangle(SKETCH33_W, SKETCH33_H)
    extrude(amount=BOSS_EXTRUDE26_DEPTH)

    # Sketch34 → Boss-Extrude27 (add)
    with BuildSketch(Plane(origin=(3212.8968, 0, 0), x_dir=(0, 0, -1), z_dir=(1, 0, 0))):
        with Locations(Location((2218.07408082, 1812.870118347, 0), (0, 0, 270))):  # turned: the seam where the file's is
            Circle(SKETCH34_R)
    extrude(amount=BOSS_EXTRUDE27_DEPTH)

    # Sketch35 → Boss-Extrude28 (add)
    with BuildSketch(Plane(origin=(0, 1014.984, 0), x_dir=(1, 0, 0), z_dir=(0, 1, 0))):
        with Locations((420.155841836, 405.384)):
            Rectangle(SKETCH35_W, SKETCH35_H)
    extrude(amount=BOSS_EXTRUDE28_DEPTH)

    # Sketch36 → Cut-Extrude9 (cut)
    with BuildSketch(Plane(origin=(0, 0, -710.184), x_dir=(-1, 0, 0), z_dir=(0, 0, -1))):
        with Locations((-420.62647127, 1016.064605357)):
            Rectangle(SKETCH36_W, SKETCH36_H)
    extrude(amount=-CUT_EXTRUDE9_DEPTH, mode=Mode.SUBTRACT)

    # Sketch37 → Boss-Extrude29 (add)
    with BuildSketch(Plane.XZ):
        with Locations((3700.666319437, -219.459647699)):
            Rectangle(SKETCH37_W, SKETCH37_H)
        with Locations((3700.666319437, -2359.140520545)):
            Rectangle(SKETCH37_W, SKETCH37_H_2)
    extrude(amount=BOSS_EXTRUDE29_DEPTH)


with BuildPart() as body_2:
    # Sketch12 → Boss-Extrude7 (new body)
    with BuildSketch(Plane(origin=(0, 2183.383999898, 0), x_dir=(1, 0, 0), z_dir=(0, 1, 0))):
        with Locations((3098.292, 984.504)):
            Rectangle(SKETCH12_W, SKETCH12_H)
    extrude(amount=BOSS_EXTRUDE7_DEPTH)


solid = Compound([part.part, body_2.part])
